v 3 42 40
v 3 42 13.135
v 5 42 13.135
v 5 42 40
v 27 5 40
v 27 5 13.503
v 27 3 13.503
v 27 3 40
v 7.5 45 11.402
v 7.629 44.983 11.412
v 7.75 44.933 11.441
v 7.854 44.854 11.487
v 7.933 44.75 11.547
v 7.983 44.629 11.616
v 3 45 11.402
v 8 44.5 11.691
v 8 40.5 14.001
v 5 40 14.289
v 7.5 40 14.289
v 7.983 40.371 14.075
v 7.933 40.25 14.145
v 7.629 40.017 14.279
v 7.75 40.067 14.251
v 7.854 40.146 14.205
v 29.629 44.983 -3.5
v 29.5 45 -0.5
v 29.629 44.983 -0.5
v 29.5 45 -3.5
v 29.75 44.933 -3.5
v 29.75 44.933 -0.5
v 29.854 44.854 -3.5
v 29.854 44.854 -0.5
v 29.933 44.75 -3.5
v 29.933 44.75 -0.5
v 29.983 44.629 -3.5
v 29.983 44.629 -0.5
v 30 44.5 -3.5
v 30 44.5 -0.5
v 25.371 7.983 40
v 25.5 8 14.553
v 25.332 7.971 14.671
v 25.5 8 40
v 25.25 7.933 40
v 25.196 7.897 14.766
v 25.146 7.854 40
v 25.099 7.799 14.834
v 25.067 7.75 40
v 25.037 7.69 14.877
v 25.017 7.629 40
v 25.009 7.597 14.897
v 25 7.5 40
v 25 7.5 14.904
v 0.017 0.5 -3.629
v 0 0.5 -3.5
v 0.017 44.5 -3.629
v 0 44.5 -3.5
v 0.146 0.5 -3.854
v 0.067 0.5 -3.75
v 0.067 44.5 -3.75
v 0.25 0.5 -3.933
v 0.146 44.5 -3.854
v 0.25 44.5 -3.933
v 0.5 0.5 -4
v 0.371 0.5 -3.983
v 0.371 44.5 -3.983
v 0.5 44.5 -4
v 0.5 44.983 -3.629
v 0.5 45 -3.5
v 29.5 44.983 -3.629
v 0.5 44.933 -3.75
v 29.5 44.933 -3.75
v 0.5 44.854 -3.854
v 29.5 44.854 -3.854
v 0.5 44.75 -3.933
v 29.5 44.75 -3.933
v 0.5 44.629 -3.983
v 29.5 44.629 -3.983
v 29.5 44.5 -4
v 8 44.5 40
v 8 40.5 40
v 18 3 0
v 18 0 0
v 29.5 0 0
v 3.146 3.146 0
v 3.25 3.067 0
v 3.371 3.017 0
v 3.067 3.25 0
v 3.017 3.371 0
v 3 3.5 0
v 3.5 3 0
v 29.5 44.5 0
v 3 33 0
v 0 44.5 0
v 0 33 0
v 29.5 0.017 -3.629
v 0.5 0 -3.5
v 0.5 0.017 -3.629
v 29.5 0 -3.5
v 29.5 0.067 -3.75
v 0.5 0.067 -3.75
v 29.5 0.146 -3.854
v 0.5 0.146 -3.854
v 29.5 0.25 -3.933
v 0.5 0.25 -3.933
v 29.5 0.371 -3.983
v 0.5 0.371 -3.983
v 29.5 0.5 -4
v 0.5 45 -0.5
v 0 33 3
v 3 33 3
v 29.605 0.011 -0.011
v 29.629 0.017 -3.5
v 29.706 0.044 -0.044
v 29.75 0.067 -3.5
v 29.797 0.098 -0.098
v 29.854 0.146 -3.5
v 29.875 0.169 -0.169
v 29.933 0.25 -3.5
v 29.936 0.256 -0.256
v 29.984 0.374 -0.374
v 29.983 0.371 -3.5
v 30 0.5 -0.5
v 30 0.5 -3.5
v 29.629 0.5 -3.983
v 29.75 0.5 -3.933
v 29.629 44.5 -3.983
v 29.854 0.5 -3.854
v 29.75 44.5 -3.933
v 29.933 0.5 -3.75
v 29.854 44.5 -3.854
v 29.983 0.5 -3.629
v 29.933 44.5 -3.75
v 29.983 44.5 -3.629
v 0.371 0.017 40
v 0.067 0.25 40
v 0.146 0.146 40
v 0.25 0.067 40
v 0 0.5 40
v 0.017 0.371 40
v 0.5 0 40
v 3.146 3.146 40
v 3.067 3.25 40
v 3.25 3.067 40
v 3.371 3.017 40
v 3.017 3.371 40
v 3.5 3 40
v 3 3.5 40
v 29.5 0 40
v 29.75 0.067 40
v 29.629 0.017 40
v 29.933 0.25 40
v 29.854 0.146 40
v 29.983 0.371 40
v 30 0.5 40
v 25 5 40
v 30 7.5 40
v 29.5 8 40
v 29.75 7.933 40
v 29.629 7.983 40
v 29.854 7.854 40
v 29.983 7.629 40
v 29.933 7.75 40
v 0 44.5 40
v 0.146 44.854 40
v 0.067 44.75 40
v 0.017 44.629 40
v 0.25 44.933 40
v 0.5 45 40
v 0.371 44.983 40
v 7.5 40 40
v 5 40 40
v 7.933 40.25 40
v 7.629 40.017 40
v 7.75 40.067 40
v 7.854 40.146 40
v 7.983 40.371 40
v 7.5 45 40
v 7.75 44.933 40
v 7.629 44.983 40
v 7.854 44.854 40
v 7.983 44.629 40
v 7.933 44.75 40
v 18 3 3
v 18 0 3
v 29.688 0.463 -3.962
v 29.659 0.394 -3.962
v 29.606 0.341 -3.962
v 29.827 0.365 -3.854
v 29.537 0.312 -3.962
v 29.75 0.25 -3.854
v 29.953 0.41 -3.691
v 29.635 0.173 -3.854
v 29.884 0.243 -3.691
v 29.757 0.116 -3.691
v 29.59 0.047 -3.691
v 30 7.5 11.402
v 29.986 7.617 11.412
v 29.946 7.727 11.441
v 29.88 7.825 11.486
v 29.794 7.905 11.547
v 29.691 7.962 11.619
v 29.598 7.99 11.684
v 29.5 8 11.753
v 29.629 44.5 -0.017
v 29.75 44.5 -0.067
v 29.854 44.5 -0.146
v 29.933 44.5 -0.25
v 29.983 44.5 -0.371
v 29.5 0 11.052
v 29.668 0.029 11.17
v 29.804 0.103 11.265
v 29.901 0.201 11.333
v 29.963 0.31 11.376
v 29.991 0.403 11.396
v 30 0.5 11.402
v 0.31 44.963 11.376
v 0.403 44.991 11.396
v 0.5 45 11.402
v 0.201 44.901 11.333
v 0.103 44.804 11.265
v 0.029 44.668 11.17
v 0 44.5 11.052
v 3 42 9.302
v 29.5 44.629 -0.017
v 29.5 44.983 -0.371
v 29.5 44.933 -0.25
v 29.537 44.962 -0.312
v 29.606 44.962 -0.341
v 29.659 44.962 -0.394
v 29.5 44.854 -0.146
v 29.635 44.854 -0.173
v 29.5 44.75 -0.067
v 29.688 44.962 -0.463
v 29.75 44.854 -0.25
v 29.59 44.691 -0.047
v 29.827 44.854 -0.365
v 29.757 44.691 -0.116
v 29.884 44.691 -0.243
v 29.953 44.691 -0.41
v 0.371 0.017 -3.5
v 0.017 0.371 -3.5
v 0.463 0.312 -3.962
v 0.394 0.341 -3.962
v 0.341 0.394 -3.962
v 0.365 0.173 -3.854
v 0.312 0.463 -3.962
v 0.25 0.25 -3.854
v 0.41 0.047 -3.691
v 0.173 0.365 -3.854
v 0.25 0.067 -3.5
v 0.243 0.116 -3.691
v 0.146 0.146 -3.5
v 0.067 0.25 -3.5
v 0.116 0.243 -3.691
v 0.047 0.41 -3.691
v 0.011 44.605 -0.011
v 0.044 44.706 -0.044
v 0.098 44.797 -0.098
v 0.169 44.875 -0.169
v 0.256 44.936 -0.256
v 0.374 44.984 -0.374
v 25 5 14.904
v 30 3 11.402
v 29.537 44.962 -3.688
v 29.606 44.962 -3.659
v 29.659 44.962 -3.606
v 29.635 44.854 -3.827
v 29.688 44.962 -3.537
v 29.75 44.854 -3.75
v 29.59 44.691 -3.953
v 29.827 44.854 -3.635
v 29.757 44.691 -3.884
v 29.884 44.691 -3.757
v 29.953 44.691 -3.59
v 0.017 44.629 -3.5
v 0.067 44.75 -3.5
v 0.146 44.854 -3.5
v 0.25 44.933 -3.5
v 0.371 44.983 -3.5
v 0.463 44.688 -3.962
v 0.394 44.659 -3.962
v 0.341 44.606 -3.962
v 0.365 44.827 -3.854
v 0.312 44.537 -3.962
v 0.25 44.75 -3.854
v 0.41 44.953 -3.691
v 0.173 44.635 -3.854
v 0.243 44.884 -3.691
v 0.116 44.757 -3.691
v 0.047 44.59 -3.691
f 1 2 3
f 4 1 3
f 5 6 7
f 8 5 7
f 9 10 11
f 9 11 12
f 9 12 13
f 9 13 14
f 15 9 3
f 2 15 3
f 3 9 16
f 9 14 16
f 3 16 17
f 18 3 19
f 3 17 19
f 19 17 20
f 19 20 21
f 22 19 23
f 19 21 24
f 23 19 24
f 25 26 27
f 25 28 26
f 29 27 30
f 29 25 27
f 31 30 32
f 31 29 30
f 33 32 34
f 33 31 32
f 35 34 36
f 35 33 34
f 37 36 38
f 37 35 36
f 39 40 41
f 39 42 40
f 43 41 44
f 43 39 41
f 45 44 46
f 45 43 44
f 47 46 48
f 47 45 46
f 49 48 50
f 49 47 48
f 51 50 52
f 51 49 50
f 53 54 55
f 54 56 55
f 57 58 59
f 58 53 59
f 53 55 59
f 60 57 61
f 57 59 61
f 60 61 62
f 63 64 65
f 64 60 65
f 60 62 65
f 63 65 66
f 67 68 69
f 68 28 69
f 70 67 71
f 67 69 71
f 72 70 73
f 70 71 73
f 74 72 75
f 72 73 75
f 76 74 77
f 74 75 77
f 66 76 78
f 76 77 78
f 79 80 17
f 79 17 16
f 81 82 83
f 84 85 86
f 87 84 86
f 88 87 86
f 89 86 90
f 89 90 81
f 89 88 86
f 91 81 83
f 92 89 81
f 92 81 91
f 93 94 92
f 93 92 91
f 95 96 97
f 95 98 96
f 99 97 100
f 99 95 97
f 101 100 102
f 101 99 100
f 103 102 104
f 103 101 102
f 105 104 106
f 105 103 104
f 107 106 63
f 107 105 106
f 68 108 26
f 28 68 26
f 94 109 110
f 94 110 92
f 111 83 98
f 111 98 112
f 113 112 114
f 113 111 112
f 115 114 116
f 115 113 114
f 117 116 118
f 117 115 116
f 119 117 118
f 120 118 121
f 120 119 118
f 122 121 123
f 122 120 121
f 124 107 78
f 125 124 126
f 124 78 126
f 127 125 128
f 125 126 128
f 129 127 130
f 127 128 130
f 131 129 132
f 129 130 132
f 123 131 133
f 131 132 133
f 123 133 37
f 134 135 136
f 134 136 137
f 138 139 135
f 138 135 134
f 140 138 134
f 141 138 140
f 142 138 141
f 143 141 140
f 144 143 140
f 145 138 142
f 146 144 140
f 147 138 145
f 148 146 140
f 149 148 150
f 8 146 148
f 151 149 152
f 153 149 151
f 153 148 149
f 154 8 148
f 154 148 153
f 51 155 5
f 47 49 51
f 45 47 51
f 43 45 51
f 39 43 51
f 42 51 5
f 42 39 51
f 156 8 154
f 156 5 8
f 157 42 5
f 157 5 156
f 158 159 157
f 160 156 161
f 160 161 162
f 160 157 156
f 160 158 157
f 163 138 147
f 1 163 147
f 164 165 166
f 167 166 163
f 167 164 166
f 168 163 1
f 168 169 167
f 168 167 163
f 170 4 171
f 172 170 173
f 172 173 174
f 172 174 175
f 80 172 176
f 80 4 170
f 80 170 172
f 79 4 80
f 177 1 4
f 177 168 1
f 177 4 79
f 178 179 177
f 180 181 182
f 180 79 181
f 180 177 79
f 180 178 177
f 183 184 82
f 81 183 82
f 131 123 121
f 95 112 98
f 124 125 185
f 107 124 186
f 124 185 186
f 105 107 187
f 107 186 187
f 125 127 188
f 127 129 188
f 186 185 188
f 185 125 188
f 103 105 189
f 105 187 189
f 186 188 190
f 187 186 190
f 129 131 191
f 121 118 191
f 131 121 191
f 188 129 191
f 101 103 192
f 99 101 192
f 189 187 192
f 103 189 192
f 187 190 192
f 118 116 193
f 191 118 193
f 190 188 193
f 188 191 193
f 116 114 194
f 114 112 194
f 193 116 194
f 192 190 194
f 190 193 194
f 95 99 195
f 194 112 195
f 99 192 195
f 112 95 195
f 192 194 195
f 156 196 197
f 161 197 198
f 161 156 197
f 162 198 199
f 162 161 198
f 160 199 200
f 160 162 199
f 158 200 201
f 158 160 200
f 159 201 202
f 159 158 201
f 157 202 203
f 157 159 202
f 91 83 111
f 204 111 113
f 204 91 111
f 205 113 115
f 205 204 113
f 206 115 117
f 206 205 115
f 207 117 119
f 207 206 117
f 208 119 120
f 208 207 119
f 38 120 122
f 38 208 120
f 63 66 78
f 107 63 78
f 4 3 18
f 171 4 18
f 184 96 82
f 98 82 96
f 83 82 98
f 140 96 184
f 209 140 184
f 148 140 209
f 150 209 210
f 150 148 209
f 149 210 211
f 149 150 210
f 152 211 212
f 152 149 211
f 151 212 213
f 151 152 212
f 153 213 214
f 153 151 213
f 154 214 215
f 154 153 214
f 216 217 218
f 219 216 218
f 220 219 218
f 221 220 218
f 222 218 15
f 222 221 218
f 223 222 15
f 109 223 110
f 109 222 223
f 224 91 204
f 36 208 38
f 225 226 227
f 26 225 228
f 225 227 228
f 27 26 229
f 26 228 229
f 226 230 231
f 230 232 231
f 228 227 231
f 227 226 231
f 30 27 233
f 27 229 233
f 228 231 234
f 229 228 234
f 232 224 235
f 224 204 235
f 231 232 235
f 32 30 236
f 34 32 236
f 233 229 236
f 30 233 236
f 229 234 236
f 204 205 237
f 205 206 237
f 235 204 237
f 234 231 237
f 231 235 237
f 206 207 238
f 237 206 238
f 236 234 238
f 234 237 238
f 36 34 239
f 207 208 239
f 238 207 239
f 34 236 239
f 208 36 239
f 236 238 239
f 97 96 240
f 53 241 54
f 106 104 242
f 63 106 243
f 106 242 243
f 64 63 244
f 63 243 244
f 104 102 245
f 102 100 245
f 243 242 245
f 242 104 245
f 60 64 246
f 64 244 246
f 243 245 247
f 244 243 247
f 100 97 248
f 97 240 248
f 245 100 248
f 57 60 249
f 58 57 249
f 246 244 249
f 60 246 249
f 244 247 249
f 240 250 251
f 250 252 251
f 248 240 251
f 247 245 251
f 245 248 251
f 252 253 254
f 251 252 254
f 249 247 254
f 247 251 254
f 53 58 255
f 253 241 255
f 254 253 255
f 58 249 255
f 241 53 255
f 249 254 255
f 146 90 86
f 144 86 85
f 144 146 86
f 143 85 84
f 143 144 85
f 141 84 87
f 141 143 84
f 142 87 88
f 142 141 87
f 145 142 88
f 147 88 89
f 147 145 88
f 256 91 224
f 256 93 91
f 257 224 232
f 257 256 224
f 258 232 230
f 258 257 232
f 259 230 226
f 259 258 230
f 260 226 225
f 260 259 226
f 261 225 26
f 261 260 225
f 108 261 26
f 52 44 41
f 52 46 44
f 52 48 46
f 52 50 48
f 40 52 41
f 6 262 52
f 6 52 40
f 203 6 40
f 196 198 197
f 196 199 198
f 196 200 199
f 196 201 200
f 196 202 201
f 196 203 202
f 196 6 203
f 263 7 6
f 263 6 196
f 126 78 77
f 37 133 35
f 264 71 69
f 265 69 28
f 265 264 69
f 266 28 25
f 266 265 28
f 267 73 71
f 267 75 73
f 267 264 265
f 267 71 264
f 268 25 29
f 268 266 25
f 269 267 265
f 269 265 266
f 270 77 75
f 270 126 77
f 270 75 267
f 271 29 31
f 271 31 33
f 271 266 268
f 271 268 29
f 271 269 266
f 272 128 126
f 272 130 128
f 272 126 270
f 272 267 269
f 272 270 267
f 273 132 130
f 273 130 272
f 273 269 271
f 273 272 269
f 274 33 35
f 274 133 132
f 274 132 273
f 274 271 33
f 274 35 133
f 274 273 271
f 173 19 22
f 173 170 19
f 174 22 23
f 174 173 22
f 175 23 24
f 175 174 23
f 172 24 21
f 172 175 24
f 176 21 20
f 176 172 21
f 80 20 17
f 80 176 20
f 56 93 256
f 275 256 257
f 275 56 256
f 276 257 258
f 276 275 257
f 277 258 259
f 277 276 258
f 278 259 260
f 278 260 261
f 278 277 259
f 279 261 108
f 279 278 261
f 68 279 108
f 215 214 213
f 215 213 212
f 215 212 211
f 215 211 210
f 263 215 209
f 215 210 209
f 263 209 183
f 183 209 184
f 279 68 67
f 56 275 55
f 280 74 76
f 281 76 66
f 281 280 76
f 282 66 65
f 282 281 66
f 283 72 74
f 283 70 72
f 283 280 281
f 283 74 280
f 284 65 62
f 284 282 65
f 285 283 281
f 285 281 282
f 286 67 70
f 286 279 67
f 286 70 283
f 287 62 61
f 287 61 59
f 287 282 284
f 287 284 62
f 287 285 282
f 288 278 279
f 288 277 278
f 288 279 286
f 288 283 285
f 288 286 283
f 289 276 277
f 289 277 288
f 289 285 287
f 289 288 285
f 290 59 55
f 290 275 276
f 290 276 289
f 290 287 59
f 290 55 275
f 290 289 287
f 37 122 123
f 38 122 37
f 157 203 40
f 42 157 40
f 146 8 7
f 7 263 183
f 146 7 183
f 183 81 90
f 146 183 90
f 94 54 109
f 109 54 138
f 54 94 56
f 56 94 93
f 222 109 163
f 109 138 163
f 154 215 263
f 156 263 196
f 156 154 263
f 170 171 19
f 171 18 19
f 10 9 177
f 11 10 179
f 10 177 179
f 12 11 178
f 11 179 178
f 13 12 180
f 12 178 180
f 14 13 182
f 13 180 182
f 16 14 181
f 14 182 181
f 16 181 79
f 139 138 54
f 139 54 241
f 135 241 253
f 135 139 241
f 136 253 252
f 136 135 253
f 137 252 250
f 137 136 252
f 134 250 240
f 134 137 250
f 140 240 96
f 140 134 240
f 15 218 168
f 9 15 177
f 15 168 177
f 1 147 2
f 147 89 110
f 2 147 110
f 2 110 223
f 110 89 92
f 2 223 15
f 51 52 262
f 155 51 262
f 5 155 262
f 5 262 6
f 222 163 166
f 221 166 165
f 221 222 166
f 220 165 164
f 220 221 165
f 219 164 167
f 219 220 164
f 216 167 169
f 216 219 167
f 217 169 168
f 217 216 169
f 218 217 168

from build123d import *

# Parameters (mm, degrees)
F1_DEPTH  = 40
F2_W      = 30
F2_H      = 45
F3_DEPTH  = 4
F5_DEPTH  = 45.001
F7_DEPTH  = 42.001
F9_DEPTH  = 30.001
F11_DEPTH = 5
F12_R     = 0.5


with BuildPart() as f1:
    # F0 (on Top) → F1 (new body)
    with BuildSketch(Plane.XY):
        Polygon((0, 0), (30, 0), (30, 8), (25, 8), (25, 5), (27, 5), (27, 3), (3, 3), (3, 42), (5, 42), (5, 40), (8, 40), (8, 45), (0, 45), align=None)
    extrude(amount=F1_DEPTH)

    # F2 (on Top) → F3 (join)
    with BuildSketch(Plane.XY):
        with Locations((15, 22.5)):
            Rectangle(F2_W, F2_H)
    extrude(amount=-F3_DEPTH)

    # F4 (on Front) → F5 (cut, through all)
    with BuildSketch(Plane.XZ):
        Polygon((18, 0), (30, 0), (30, 11.40249), (18, 3), align=None)
    extrude(amount=-F5_DEPTH, mode=Mode.SUBTRACT)

    # F6 (on face) → F7 (cut, through all)
    with BuildSketch(Plane(origin=(0, 3, 0), x_dir=(-1, 0, 0), z_dir=(0, 1, 0))):
        Polygon((-18, 3), (-18, 19.804981), (-30, 11.40249), (-30, 3), align=None)
    extrude(amount=F7_DEPTH, mode=Mode.SUBTRACT)

    # F8 (on Right) → F9 (cut, through all)
    with BuildSketch(Plane.YZ):
        Polygon((33, 0), (45, 0), (45, 11.40249), (33, 3), align=None)
    extrude(amount=F9_DEPTH, mode=Mode.SUBTRACT)

    # F10 (on face) → F11 (cut, through all)
    with BuildSketch(Plane.YZ.offset(8)):
        Polygon((40, 7.901453), (45, 11.40249), (40, 14.289242), align=None)
    extrude(amount=-F11_DEPTH, mode=Mode.SUBTRACT)

    # F12
    f12_edges = [f1.edges().sort_by_distance(p)[0] for p in [
        (0, 45, 25.701245),
        (0, 45, -2),
        (0, 0, 18),
        (30, 0, 25.701245),
        (30, 0, -2),
        (30, 8, 25.701245),
        (8, 40, 27.144621),
        (8, 45, 25.701245),
        (30, 22.5, 0),
        (30, 22.5, -4),
        (15, 45, 0),
        (15, 45, -4),
        (30, 45, -2),
        (25, 8, 27.451764),
        (15, 0, -4),
        (0, 22.5, -4),
        (3, 3, 20),
    ]]
    fillet(f12_edges, radius=F12_R)


solid = f1.part
